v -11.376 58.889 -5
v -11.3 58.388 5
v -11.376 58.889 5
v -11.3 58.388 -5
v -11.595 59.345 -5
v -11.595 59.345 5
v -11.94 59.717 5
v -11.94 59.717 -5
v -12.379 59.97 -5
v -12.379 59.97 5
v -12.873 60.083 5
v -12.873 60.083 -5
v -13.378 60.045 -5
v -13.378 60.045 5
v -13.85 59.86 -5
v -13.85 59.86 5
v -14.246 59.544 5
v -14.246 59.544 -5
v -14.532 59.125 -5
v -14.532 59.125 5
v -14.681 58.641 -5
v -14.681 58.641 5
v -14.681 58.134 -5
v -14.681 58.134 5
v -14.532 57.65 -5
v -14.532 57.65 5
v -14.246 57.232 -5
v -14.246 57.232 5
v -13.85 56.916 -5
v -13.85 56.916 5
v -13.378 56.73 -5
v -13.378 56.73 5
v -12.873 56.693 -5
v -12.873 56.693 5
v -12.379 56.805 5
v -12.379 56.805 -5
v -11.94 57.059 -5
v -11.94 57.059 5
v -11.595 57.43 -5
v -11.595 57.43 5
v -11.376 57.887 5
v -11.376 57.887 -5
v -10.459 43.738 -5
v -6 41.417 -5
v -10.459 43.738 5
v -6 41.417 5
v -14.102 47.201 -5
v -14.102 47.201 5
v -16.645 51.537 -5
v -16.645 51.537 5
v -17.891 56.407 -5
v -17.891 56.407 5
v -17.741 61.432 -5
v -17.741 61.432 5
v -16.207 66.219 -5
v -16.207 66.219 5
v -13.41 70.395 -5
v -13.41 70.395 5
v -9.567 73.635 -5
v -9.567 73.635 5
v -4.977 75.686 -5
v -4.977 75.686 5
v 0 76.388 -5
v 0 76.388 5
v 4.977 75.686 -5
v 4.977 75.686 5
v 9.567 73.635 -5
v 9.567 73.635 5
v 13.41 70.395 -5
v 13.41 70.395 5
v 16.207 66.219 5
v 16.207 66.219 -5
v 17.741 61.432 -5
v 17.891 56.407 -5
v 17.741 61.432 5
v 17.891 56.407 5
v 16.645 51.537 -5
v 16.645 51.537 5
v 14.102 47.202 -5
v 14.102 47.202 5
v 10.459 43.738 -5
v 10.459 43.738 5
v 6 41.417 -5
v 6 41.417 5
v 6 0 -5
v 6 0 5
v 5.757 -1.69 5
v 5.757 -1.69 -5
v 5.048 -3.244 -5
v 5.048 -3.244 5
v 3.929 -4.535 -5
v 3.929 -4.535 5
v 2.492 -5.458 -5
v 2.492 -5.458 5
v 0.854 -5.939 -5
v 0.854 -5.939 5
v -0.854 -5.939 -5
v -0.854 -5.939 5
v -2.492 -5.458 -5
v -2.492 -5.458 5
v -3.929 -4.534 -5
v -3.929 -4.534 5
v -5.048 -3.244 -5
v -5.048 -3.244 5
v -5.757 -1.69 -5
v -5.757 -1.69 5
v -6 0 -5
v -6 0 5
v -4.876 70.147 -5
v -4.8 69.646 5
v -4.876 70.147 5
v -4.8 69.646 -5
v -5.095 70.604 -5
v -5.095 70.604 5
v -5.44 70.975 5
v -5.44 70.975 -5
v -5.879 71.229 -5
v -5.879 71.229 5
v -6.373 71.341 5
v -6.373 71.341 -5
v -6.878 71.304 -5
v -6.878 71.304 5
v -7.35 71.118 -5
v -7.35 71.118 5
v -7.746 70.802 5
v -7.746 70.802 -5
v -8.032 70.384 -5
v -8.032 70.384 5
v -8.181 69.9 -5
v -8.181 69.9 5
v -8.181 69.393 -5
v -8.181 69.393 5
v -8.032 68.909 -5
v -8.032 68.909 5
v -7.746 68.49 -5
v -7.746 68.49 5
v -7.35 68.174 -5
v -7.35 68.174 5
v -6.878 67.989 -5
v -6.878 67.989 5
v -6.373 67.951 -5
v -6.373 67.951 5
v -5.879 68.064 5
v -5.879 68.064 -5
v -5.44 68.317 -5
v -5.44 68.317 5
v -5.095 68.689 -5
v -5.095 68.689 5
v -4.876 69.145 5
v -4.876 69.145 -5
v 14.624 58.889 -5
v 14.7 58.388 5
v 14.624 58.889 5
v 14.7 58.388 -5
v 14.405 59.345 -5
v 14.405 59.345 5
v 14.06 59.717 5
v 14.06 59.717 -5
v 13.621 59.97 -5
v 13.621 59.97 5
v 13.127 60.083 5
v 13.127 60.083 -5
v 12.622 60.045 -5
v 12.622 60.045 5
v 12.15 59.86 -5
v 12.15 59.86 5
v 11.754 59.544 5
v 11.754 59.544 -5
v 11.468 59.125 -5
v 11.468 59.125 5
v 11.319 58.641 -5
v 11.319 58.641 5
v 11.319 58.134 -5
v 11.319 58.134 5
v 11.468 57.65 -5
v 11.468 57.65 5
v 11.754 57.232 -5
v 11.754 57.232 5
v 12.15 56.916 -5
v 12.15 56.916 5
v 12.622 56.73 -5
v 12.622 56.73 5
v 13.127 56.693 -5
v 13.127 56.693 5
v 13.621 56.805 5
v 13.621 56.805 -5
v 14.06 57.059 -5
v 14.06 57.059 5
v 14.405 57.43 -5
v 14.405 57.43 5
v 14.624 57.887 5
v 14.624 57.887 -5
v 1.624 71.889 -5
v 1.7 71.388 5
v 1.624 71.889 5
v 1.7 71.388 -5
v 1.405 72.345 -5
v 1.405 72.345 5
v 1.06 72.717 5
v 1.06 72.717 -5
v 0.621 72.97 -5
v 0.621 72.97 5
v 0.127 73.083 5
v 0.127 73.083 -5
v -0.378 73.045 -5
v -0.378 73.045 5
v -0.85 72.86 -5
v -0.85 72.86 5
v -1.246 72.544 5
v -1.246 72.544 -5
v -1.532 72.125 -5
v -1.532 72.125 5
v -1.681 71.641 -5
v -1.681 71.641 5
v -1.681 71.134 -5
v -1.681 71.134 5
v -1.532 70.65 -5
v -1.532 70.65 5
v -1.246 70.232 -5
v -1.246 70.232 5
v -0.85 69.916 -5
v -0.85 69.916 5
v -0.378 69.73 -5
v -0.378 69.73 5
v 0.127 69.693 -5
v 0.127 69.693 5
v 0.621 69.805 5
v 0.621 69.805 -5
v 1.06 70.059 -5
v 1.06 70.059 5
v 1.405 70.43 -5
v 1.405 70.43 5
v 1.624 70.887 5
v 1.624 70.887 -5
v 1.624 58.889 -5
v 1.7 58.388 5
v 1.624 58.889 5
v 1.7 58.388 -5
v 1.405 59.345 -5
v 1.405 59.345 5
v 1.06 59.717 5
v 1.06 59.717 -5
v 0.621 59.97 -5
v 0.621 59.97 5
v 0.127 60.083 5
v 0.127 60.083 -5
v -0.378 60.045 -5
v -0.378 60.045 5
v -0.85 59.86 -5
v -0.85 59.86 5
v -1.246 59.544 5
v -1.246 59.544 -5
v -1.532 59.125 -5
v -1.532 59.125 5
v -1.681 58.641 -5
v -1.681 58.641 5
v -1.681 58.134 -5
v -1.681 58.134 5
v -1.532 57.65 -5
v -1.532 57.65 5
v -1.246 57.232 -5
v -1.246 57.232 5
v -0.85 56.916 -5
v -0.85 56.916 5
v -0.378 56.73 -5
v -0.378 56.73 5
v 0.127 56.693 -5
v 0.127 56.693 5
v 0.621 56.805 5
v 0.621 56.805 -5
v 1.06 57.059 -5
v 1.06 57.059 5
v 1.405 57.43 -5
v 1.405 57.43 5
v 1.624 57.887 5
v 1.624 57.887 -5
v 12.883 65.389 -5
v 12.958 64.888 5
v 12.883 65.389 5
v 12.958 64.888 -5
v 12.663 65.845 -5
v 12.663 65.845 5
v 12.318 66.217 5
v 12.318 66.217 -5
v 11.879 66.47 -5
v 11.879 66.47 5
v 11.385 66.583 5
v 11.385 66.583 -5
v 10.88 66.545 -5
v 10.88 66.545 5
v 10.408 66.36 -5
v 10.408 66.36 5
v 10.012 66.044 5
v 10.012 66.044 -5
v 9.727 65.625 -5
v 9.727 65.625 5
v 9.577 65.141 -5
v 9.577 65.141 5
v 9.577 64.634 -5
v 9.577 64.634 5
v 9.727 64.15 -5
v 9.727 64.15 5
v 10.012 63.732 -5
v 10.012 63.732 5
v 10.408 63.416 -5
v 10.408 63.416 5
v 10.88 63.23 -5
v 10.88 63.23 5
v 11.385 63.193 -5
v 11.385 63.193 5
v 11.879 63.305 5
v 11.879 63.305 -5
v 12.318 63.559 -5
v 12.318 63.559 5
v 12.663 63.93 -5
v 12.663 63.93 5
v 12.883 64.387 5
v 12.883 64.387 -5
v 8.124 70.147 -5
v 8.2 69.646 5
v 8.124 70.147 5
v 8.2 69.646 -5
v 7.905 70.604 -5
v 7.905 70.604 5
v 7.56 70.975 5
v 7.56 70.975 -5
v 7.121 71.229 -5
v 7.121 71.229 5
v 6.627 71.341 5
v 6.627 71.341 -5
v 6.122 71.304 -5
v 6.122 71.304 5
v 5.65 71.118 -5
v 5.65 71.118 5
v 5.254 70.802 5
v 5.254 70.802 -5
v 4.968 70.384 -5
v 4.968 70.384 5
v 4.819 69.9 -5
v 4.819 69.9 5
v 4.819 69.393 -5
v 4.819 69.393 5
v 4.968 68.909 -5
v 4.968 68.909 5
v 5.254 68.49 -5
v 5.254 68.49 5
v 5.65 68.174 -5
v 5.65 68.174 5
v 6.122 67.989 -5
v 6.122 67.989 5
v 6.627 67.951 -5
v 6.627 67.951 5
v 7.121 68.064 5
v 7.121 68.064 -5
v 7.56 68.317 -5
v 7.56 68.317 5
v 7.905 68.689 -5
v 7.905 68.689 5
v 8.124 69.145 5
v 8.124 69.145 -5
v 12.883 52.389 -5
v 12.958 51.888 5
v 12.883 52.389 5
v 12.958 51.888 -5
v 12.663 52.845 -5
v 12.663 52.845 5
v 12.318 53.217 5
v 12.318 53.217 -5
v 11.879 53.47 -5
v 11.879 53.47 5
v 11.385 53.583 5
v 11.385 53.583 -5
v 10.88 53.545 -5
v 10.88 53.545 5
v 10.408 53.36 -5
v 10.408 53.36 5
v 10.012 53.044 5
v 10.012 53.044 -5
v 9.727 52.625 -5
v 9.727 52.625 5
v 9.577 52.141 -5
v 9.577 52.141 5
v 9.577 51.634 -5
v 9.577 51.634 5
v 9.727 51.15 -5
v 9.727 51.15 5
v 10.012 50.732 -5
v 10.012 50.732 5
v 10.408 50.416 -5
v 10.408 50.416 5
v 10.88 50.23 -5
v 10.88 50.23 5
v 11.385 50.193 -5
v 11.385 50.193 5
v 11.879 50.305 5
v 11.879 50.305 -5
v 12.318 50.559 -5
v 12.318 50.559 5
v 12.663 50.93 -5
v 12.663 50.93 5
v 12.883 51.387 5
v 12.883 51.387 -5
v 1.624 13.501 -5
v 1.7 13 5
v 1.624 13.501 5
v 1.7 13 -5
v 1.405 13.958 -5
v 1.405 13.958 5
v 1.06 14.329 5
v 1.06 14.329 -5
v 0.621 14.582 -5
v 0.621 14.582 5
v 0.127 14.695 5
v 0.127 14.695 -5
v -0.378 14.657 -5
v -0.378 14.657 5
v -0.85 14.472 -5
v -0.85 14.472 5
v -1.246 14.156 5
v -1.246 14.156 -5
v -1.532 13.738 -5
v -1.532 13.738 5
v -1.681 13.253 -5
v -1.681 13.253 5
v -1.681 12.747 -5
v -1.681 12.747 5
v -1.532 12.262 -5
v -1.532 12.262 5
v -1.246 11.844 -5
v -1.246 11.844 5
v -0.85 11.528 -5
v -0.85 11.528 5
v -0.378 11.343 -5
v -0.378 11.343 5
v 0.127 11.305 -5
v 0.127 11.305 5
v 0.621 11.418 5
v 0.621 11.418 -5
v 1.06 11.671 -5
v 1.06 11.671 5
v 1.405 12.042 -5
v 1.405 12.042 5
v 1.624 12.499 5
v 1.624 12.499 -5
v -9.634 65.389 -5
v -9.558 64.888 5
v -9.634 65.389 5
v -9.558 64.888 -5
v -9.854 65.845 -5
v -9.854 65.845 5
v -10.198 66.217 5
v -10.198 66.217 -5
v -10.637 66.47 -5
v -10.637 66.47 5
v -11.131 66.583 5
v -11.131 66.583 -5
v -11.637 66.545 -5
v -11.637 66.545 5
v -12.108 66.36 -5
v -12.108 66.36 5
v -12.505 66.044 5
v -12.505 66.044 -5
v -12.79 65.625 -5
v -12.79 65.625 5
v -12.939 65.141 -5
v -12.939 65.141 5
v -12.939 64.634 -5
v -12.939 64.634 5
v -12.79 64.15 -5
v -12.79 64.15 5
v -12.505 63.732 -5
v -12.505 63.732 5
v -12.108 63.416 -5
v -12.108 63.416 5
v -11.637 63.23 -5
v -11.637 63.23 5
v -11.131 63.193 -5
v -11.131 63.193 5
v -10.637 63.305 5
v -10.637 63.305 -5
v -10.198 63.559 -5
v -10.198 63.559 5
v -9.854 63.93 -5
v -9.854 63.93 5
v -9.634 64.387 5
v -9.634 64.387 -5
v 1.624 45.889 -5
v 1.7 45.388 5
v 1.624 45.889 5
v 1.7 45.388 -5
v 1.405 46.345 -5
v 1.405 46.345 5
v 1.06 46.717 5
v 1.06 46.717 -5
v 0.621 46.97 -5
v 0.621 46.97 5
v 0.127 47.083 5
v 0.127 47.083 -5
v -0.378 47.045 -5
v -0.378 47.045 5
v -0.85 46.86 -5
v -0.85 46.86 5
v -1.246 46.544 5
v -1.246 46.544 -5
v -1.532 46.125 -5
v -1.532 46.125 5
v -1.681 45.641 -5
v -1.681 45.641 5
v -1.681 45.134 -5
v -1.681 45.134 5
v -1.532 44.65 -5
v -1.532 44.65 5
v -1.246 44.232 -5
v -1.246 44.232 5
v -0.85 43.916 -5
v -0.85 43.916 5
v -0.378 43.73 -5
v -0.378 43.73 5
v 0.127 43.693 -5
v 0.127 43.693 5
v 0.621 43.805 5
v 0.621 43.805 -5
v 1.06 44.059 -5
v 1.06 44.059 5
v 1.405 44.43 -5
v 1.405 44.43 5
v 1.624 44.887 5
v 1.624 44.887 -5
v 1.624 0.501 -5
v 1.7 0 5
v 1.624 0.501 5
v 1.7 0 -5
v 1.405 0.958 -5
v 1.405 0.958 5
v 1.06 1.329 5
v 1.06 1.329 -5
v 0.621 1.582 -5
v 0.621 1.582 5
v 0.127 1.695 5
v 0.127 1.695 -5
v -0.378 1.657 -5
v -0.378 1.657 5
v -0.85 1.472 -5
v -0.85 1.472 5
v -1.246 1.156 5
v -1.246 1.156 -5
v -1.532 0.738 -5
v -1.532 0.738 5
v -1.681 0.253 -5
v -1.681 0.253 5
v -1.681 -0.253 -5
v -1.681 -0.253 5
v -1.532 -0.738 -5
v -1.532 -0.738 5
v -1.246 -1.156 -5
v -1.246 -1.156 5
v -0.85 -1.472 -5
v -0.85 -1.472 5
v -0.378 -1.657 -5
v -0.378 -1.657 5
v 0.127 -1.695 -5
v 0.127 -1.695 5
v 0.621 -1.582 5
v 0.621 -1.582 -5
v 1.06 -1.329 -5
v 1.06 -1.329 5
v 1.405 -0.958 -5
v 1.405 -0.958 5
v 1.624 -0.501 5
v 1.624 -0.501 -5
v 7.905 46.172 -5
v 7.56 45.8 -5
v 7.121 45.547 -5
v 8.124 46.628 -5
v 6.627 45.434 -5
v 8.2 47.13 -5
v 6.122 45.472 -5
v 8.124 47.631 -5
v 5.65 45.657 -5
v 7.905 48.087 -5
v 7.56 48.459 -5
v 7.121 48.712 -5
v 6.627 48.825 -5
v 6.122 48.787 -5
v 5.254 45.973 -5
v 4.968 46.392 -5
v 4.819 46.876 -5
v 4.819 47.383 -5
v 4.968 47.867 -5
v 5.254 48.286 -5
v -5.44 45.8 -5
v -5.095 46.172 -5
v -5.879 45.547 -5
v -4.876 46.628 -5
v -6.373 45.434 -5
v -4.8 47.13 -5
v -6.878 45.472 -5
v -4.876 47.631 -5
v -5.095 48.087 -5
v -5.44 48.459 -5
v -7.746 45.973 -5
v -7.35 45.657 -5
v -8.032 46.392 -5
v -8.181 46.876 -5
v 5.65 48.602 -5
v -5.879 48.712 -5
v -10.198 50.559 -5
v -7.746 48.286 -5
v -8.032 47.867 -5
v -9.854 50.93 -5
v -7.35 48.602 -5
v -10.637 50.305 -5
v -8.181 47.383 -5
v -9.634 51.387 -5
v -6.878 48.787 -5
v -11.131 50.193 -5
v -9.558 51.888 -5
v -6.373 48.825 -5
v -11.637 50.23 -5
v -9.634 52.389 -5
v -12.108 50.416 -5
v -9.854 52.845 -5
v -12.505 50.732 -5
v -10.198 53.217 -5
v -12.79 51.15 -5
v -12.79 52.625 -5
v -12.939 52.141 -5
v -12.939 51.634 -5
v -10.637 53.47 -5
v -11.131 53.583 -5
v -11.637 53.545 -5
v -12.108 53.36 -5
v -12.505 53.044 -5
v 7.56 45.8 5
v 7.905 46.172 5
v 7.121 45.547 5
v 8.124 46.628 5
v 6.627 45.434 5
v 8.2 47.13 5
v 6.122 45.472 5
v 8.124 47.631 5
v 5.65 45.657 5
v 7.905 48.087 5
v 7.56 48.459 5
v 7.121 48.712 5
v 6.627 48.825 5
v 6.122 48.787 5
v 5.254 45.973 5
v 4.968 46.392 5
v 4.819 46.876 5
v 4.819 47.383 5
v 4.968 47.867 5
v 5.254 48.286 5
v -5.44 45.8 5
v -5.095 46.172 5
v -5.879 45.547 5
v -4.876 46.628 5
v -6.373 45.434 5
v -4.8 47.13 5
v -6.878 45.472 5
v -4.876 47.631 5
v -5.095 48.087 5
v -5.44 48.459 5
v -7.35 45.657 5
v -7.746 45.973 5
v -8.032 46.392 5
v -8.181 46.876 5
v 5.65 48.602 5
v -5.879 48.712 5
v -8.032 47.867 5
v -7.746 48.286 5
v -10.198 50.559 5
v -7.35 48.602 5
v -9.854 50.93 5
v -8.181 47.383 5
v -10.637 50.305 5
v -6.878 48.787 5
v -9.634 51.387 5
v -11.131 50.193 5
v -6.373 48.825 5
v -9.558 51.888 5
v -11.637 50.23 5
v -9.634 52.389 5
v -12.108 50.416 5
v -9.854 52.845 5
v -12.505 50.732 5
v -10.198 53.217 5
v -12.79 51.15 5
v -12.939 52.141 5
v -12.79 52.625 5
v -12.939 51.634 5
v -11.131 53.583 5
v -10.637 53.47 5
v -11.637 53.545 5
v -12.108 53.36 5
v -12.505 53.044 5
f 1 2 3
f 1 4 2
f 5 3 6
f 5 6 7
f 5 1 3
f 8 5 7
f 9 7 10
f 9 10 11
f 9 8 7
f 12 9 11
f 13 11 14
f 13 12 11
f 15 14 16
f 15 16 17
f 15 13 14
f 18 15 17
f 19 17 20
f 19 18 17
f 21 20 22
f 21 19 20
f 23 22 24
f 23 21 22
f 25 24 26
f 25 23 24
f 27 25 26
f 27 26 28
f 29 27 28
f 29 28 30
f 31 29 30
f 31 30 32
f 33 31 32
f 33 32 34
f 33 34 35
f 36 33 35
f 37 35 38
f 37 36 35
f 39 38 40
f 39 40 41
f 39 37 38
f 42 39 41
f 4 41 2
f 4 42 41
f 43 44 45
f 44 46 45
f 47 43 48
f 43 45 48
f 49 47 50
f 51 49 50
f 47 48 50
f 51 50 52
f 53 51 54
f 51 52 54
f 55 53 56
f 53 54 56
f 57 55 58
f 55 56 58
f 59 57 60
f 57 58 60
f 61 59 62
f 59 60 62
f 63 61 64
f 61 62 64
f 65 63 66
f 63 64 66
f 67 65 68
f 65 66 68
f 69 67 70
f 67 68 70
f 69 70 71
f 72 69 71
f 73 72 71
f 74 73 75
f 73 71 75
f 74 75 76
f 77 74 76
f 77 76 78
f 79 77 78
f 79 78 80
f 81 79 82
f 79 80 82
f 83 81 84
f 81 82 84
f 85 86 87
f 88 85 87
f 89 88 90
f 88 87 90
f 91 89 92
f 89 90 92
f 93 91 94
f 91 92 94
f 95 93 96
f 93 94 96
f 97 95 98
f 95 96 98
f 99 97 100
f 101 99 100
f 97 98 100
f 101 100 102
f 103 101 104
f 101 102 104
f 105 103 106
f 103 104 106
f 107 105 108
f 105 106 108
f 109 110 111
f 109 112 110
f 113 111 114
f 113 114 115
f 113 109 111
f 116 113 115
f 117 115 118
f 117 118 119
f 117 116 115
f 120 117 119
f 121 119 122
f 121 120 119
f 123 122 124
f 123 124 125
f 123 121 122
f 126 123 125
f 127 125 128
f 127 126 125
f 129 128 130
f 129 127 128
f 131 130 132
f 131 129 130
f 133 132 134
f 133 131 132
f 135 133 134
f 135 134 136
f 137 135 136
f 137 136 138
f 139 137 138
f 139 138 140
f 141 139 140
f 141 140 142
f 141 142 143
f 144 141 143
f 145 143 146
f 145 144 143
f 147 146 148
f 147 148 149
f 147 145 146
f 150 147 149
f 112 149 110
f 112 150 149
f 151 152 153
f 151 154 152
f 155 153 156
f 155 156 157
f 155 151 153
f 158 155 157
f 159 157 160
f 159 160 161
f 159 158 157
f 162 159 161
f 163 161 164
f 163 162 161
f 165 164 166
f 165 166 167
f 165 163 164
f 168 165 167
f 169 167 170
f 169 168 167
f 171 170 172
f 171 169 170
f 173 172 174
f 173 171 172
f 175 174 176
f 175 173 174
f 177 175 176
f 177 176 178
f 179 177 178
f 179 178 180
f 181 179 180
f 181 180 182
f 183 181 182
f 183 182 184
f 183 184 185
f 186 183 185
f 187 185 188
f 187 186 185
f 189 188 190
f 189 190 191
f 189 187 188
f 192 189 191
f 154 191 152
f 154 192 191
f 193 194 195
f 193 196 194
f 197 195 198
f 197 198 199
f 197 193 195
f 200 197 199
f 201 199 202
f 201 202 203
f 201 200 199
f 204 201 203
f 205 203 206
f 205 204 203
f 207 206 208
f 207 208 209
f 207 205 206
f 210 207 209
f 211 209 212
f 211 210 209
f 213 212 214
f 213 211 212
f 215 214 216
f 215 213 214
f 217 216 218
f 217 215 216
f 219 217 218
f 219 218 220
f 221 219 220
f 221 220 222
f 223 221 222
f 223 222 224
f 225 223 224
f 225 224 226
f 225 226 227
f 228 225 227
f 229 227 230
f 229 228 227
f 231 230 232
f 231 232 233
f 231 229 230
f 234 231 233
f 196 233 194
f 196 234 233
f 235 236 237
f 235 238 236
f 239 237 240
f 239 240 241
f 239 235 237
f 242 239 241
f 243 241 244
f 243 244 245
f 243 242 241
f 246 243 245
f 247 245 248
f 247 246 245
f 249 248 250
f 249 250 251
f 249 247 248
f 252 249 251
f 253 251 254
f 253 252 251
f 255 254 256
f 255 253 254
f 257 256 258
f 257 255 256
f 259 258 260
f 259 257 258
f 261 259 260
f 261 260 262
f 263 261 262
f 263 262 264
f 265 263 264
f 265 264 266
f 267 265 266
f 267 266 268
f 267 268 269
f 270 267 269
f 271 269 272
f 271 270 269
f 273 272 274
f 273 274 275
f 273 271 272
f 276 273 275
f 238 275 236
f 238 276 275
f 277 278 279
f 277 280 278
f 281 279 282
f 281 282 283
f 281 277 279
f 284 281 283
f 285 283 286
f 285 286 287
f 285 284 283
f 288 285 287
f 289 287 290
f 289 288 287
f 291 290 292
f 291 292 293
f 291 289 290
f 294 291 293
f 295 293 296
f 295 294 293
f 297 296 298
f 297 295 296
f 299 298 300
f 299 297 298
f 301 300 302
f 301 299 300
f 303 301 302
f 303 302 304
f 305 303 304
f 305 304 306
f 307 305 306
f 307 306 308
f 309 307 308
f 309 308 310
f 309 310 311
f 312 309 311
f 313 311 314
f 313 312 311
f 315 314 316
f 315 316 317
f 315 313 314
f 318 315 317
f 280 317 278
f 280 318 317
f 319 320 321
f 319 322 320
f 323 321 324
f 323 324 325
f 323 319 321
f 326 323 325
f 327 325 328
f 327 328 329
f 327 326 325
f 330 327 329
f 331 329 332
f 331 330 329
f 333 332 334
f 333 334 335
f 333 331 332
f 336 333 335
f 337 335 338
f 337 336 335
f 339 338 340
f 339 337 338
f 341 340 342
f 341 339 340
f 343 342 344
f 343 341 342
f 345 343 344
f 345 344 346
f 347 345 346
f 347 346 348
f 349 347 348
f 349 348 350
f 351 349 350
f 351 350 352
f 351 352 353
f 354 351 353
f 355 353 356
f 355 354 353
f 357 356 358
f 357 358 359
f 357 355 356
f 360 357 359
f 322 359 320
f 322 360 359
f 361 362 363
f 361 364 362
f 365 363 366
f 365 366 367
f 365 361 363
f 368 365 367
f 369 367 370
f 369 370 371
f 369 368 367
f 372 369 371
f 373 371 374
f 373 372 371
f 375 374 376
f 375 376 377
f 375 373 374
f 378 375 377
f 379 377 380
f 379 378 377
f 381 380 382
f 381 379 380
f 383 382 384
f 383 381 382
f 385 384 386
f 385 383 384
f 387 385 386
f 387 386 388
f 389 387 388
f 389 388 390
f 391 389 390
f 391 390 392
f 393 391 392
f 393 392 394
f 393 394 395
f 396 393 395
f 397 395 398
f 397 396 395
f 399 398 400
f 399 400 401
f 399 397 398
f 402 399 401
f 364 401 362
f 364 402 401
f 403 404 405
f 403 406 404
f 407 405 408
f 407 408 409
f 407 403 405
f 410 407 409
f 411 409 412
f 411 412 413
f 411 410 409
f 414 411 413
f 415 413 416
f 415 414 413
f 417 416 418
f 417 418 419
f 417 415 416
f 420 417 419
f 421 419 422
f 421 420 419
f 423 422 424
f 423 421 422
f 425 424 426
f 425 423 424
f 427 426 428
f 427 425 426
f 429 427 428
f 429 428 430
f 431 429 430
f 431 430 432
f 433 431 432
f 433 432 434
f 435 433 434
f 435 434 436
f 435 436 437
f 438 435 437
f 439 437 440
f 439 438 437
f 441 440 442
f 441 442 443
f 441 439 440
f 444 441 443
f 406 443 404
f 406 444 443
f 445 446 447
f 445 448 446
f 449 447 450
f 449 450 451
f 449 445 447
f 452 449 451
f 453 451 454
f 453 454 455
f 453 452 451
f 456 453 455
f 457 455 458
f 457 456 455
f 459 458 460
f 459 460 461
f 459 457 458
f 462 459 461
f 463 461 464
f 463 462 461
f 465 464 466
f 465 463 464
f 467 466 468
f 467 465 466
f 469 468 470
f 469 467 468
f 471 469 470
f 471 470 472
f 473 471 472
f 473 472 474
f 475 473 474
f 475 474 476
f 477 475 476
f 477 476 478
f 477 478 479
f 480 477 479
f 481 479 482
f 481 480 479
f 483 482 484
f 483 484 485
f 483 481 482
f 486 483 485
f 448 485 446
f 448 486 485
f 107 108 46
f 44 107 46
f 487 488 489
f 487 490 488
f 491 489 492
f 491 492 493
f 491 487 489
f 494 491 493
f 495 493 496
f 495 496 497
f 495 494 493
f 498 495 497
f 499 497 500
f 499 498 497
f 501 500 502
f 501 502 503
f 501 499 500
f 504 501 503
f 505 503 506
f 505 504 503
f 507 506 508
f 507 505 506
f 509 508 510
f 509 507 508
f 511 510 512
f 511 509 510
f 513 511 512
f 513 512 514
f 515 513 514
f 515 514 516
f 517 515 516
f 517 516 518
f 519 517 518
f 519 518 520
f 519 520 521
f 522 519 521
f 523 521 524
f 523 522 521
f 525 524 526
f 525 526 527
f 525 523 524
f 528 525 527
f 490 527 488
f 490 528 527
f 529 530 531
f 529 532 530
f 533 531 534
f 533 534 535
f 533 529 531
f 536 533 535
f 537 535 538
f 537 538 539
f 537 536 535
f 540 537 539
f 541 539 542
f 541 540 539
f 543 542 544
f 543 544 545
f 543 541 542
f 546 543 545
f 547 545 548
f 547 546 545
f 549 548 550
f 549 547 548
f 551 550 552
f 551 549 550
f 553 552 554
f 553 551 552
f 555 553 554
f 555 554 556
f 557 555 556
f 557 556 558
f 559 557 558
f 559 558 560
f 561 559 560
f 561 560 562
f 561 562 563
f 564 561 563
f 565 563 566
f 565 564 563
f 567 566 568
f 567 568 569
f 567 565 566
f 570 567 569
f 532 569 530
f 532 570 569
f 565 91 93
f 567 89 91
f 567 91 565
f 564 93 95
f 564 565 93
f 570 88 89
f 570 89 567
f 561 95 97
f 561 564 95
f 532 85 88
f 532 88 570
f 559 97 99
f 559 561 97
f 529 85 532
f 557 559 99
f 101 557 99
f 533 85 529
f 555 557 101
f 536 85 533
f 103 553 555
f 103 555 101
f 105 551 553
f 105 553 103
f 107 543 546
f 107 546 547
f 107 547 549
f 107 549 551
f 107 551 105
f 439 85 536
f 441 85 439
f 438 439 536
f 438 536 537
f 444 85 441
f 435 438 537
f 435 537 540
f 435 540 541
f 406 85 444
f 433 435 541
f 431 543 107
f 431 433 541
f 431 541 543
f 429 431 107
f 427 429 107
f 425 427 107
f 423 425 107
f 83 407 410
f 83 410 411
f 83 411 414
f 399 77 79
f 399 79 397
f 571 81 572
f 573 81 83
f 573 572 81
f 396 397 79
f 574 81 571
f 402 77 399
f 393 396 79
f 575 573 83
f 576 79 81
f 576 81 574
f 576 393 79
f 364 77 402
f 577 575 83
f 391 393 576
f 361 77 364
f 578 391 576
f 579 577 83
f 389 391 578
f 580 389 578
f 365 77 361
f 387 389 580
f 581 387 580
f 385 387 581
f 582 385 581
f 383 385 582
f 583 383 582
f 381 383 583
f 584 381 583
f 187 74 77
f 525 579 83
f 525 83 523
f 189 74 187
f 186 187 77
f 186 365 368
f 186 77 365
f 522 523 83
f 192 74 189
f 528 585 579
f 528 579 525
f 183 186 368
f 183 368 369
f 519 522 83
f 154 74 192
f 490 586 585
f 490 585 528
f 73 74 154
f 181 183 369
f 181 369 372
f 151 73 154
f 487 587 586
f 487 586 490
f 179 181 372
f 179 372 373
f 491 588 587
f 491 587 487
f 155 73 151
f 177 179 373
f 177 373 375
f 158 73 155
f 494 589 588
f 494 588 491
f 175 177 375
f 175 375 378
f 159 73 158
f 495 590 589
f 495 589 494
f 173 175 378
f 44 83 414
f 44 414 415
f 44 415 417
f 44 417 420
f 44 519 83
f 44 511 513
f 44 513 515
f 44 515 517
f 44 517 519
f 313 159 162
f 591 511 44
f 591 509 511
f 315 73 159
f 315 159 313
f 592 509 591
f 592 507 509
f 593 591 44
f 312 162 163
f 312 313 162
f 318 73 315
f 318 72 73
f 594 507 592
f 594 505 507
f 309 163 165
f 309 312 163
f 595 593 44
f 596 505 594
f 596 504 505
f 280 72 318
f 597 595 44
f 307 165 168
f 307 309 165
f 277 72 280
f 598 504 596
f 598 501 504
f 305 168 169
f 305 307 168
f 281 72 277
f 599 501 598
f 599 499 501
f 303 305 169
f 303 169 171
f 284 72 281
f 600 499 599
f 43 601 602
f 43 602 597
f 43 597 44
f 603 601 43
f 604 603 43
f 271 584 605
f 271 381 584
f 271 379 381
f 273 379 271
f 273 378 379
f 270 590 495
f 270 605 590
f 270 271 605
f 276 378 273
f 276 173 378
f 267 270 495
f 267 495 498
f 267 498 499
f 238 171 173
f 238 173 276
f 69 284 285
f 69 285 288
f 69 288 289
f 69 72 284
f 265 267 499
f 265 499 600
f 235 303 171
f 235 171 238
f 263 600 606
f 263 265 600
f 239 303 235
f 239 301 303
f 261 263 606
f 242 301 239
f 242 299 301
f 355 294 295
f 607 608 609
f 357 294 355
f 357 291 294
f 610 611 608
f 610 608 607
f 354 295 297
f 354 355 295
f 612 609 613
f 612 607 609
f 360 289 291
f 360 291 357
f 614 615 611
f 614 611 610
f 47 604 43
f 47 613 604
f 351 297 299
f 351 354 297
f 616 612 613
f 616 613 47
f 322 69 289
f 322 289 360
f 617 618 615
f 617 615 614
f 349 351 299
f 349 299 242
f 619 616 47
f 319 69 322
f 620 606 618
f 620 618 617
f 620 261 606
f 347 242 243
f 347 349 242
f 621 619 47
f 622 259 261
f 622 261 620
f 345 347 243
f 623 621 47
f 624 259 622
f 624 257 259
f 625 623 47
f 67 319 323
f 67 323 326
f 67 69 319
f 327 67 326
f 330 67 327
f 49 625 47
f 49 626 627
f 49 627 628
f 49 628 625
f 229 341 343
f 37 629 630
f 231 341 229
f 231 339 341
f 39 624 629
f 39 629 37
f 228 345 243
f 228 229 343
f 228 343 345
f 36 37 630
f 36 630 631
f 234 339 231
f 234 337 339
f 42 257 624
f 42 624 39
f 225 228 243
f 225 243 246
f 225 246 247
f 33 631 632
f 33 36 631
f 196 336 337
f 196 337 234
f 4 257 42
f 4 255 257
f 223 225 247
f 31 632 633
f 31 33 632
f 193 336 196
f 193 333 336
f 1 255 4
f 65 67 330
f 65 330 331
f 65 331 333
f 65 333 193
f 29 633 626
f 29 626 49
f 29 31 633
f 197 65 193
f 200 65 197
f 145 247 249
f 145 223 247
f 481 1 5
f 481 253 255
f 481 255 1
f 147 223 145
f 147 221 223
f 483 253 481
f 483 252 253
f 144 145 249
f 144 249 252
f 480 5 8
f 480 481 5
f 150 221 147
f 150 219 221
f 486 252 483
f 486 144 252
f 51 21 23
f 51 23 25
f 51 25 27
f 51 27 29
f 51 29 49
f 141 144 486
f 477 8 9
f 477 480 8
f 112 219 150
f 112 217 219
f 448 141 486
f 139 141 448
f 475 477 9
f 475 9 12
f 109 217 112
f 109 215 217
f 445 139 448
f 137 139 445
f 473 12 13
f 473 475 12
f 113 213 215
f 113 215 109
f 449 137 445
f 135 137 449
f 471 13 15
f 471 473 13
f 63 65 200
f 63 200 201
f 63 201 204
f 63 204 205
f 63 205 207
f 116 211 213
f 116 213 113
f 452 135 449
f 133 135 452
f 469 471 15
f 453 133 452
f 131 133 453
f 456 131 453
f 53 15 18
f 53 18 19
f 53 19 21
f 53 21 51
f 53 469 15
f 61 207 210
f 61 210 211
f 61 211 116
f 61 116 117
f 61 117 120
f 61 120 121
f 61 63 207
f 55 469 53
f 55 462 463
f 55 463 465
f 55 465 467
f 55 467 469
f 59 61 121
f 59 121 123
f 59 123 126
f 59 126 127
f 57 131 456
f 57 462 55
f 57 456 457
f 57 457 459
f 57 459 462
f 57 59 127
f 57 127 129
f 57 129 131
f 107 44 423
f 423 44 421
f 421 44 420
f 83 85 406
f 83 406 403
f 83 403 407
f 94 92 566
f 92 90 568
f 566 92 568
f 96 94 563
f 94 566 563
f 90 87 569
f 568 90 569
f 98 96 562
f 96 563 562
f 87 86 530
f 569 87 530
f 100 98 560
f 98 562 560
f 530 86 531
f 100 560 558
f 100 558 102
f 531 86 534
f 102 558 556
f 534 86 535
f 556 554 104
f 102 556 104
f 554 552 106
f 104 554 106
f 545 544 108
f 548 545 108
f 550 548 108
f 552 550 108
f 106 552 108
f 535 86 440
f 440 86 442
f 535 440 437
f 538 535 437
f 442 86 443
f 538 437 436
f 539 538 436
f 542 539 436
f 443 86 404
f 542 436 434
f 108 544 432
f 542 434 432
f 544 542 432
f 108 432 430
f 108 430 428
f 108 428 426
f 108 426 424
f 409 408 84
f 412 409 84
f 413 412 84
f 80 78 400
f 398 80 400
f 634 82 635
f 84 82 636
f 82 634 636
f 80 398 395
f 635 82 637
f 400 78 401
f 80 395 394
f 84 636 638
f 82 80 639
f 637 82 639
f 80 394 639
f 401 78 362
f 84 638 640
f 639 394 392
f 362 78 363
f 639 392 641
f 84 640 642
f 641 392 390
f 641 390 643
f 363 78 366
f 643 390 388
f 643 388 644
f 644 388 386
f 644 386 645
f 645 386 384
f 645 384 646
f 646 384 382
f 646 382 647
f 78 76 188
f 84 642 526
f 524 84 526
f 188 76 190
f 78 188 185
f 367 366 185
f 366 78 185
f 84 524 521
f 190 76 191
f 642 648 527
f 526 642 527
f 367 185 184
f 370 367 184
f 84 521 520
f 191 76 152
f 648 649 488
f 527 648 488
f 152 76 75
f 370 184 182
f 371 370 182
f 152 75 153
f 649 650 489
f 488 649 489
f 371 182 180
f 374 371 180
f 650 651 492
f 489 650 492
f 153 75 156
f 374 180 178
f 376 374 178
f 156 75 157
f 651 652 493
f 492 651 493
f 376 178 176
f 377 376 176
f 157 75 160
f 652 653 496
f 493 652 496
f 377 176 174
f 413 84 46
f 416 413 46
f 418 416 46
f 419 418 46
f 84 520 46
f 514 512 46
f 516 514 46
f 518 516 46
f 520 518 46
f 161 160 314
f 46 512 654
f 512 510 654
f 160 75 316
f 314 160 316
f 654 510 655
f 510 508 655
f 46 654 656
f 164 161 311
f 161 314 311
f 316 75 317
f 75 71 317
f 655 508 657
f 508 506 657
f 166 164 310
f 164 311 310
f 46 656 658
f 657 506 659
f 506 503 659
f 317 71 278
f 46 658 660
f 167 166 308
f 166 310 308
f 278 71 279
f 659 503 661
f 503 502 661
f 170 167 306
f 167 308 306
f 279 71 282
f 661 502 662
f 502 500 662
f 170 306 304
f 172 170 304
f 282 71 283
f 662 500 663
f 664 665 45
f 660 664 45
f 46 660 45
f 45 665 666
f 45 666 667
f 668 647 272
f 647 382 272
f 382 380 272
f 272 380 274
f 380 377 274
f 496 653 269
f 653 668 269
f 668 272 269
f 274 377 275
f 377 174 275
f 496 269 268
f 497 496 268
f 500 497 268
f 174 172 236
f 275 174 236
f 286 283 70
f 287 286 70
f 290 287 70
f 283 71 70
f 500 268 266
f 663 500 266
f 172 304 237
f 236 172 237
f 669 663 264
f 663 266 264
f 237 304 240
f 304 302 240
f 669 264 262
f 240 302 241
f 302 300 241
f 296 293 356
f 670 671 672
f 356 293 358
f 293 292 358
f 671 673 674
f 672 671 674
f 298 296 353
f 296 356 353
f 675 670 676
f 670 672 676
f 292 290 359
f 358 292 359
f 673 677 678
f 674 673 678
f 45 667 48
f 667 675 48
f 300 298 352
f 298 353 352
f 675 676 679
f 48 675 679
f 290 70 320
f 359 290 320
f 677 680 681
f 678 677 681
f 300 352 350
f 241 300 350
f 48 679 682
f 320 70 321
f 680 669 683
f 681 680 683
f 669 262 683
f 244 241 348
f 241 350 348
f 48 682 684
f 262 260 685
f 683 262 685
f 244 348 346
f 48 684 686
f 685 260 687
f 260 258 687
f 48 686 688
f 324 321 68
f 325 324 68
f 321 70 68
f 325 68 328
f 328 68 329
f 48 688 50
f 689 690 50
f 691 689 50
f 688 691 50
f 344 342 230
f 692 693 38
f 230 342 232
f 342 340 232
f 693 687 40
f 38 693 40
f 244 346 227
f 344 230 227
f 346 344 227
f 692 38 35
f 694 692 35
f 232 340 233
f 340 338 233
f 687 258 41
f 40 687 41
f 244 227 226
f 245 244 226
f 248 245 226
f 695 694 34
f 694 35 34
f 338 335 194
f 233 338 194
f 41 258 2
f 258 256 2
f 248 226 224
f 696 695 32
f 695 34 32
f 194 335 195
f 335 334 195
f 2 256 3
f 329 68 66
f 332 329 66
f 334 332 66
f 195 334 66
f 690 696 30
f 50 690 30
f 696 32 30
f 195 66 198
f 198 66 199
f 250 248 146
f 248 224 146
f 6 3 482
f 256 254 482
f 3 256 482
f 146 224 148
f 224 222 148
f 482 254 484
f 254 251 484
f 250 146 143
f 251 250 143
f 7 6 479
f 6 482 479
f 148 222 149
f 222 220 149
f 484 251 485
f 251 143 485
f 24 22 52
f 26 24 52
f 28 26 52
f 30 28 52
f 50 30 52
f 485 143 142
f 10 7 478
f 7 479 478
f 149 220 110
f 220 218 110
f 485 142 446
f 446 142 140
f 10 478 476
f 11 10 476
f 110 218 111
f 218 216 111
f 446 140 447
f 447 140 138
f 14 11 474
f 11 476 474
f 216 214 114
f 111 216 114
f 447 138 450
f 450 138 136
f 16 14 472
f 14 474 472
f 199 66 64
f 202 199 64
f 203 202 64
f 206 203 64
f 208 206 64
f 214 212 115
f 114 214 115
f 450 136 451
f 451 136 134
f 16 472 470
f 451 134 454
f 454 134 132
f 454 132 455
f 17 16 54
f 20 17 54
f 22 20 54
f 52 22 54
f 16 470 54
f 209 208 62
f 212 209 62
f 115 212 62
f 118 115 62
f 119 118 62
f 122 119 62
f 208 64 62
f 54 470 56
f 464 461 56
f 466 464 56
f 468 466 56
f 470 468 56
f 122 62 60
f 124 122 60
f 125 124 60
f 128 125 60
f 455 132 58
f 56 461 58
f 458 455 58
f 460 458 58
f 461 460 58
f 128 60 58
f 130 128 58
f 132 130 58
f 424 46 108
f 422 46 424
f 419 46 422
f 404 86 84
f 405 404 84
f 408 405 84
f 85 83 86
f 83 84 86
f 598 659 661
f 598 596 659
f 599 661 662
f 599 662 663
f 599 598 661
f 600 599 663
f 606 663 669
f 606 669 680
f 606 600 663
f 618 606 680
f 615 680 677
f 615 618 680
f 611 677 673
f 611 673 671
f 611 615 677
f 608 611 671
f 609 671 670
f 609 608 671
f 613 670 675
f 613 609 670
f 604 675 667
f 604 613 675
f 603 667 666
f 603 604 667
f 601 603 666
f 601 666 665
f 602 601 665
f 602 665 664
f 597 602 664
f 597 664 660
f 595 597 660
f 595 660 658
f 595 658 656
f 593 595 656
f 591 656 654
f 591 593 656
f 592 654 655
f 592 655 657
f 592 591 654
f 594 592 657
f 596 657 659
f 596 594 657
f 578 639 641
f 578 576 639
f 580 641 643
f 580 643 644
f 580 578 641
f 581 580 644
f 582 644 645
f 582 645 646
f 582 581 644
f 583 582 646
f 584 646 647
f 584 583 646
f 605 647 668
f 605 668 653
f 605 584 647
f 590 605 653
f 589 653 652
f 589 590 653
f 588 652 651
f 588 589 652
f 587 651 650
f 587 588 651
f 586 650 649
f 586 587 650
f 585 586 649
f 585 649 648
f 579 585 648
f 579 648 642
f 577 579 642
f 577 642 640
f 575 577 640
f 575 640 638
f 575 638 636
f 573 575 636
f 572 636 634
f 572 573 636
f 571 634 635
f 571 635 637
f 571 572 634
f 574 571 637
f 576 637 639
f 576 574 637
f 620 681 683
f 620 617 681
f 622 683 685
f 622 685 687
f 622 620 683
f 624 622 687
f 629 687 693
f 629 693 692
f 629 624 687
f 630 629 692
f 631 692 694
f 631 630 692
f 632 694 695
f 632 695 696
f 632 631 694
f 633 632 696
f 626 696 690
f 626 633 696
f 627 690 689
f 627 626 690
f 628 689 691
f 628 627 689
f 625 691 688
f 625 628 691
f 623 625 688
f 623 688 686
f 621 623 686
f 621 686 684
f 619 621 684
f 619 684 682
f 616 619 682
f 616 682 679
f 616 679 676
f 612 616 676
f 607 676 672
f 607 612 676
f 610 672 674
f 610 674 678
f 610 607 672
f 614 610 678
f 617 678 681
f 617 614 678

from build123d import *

# Parameters (mm, degrees)
SKETCH1_R           = 1.7
BOSS_EXTRUDE1_DEPTH = 5


with BuildPart() as part:
    # Sketch1 → Boss-Extrude1 (new, symmetric)
    with BuildSketch(Plane.XY):
        with BuildLine():
            Line((-6, 9.245e-06), (-5.999970251, 41.417257276))
            ThreePointArc((-5.999970251, 41.417257276), (-3.1553e-05, 76.387830542), (6.000029749, 41.417278312))
            Line((6.000029749, 41.417278312), (6, -1.1791e-05))
            ThreePointArc((6, -1.1791e-05), (-1.0518e-05, -6), (-6, 9.245e-06))
        make_face()
        Circle(SKETCH1_R, mode=Mode.SUBTRACT)
        with Locations((0, 13)):
            Circle(SKETCH1_R, mode=Mode.SUBTRACT)
        with Locations((0, 58.387830542)):
            Circle(SKETCH1_R, mode=Mode.SUBTRACT)
        with Locations((0, 45.387830542)):
            Circle(SKETCH1_R, mode=Mode.SUBTRACT)
        with Locations((-6.5, 47.129500293)):
            Circle(SKETCH1_R, mode=Mode.SUBTRACT)
        with Locations((-11.258330249, 51.887830542)):
            Circle(SKETCH1_R, mode=Mode.SUBTRACT)
        with Locations((-13, 58.387830542)):
            Circle(SKETCH1_R, mode=Mode.SUBTRACT)
        with Locations((-11.258330249, 64.887830542)):
            Circle(SKETCH1_R, mode=Mode.SUBTRACT)
        with Locations((-6.5, 69.646160791)):
            Circle(SKETCH1_R, mode=Mode.SUBTRACT)
        with Locations((0, 71.387830542)):
            Circle(SKETCH1_R, mode=Mode.SUBTRACT)
        with Locations((6.5, 69.646160791)):
            Circle(SKETCH1_R, mode=Mode.SUBTRACT)
        with Locations((11.258330249, 64.887830542)):
            Circle(SKETCH1_R, mode=Mode.SUBTRACT)
        with Locations((13, 58.387830542)):
            Circle(SKETCH1_R, mode=Mode.SUBTRACT)
        with Locations((11.258330249, 51.887830542)):
            Circle(SKETCH1_R, mode=Mode.SUBTRACT)
        with Locations((6.5, 47.129500293)):
            Circle(SKETCH1_R, mode=Mode.SUBTRACT)
    extrude(amount=BOSS_EXTRUDE1_DEPTH, both=True)


solid = part.part
